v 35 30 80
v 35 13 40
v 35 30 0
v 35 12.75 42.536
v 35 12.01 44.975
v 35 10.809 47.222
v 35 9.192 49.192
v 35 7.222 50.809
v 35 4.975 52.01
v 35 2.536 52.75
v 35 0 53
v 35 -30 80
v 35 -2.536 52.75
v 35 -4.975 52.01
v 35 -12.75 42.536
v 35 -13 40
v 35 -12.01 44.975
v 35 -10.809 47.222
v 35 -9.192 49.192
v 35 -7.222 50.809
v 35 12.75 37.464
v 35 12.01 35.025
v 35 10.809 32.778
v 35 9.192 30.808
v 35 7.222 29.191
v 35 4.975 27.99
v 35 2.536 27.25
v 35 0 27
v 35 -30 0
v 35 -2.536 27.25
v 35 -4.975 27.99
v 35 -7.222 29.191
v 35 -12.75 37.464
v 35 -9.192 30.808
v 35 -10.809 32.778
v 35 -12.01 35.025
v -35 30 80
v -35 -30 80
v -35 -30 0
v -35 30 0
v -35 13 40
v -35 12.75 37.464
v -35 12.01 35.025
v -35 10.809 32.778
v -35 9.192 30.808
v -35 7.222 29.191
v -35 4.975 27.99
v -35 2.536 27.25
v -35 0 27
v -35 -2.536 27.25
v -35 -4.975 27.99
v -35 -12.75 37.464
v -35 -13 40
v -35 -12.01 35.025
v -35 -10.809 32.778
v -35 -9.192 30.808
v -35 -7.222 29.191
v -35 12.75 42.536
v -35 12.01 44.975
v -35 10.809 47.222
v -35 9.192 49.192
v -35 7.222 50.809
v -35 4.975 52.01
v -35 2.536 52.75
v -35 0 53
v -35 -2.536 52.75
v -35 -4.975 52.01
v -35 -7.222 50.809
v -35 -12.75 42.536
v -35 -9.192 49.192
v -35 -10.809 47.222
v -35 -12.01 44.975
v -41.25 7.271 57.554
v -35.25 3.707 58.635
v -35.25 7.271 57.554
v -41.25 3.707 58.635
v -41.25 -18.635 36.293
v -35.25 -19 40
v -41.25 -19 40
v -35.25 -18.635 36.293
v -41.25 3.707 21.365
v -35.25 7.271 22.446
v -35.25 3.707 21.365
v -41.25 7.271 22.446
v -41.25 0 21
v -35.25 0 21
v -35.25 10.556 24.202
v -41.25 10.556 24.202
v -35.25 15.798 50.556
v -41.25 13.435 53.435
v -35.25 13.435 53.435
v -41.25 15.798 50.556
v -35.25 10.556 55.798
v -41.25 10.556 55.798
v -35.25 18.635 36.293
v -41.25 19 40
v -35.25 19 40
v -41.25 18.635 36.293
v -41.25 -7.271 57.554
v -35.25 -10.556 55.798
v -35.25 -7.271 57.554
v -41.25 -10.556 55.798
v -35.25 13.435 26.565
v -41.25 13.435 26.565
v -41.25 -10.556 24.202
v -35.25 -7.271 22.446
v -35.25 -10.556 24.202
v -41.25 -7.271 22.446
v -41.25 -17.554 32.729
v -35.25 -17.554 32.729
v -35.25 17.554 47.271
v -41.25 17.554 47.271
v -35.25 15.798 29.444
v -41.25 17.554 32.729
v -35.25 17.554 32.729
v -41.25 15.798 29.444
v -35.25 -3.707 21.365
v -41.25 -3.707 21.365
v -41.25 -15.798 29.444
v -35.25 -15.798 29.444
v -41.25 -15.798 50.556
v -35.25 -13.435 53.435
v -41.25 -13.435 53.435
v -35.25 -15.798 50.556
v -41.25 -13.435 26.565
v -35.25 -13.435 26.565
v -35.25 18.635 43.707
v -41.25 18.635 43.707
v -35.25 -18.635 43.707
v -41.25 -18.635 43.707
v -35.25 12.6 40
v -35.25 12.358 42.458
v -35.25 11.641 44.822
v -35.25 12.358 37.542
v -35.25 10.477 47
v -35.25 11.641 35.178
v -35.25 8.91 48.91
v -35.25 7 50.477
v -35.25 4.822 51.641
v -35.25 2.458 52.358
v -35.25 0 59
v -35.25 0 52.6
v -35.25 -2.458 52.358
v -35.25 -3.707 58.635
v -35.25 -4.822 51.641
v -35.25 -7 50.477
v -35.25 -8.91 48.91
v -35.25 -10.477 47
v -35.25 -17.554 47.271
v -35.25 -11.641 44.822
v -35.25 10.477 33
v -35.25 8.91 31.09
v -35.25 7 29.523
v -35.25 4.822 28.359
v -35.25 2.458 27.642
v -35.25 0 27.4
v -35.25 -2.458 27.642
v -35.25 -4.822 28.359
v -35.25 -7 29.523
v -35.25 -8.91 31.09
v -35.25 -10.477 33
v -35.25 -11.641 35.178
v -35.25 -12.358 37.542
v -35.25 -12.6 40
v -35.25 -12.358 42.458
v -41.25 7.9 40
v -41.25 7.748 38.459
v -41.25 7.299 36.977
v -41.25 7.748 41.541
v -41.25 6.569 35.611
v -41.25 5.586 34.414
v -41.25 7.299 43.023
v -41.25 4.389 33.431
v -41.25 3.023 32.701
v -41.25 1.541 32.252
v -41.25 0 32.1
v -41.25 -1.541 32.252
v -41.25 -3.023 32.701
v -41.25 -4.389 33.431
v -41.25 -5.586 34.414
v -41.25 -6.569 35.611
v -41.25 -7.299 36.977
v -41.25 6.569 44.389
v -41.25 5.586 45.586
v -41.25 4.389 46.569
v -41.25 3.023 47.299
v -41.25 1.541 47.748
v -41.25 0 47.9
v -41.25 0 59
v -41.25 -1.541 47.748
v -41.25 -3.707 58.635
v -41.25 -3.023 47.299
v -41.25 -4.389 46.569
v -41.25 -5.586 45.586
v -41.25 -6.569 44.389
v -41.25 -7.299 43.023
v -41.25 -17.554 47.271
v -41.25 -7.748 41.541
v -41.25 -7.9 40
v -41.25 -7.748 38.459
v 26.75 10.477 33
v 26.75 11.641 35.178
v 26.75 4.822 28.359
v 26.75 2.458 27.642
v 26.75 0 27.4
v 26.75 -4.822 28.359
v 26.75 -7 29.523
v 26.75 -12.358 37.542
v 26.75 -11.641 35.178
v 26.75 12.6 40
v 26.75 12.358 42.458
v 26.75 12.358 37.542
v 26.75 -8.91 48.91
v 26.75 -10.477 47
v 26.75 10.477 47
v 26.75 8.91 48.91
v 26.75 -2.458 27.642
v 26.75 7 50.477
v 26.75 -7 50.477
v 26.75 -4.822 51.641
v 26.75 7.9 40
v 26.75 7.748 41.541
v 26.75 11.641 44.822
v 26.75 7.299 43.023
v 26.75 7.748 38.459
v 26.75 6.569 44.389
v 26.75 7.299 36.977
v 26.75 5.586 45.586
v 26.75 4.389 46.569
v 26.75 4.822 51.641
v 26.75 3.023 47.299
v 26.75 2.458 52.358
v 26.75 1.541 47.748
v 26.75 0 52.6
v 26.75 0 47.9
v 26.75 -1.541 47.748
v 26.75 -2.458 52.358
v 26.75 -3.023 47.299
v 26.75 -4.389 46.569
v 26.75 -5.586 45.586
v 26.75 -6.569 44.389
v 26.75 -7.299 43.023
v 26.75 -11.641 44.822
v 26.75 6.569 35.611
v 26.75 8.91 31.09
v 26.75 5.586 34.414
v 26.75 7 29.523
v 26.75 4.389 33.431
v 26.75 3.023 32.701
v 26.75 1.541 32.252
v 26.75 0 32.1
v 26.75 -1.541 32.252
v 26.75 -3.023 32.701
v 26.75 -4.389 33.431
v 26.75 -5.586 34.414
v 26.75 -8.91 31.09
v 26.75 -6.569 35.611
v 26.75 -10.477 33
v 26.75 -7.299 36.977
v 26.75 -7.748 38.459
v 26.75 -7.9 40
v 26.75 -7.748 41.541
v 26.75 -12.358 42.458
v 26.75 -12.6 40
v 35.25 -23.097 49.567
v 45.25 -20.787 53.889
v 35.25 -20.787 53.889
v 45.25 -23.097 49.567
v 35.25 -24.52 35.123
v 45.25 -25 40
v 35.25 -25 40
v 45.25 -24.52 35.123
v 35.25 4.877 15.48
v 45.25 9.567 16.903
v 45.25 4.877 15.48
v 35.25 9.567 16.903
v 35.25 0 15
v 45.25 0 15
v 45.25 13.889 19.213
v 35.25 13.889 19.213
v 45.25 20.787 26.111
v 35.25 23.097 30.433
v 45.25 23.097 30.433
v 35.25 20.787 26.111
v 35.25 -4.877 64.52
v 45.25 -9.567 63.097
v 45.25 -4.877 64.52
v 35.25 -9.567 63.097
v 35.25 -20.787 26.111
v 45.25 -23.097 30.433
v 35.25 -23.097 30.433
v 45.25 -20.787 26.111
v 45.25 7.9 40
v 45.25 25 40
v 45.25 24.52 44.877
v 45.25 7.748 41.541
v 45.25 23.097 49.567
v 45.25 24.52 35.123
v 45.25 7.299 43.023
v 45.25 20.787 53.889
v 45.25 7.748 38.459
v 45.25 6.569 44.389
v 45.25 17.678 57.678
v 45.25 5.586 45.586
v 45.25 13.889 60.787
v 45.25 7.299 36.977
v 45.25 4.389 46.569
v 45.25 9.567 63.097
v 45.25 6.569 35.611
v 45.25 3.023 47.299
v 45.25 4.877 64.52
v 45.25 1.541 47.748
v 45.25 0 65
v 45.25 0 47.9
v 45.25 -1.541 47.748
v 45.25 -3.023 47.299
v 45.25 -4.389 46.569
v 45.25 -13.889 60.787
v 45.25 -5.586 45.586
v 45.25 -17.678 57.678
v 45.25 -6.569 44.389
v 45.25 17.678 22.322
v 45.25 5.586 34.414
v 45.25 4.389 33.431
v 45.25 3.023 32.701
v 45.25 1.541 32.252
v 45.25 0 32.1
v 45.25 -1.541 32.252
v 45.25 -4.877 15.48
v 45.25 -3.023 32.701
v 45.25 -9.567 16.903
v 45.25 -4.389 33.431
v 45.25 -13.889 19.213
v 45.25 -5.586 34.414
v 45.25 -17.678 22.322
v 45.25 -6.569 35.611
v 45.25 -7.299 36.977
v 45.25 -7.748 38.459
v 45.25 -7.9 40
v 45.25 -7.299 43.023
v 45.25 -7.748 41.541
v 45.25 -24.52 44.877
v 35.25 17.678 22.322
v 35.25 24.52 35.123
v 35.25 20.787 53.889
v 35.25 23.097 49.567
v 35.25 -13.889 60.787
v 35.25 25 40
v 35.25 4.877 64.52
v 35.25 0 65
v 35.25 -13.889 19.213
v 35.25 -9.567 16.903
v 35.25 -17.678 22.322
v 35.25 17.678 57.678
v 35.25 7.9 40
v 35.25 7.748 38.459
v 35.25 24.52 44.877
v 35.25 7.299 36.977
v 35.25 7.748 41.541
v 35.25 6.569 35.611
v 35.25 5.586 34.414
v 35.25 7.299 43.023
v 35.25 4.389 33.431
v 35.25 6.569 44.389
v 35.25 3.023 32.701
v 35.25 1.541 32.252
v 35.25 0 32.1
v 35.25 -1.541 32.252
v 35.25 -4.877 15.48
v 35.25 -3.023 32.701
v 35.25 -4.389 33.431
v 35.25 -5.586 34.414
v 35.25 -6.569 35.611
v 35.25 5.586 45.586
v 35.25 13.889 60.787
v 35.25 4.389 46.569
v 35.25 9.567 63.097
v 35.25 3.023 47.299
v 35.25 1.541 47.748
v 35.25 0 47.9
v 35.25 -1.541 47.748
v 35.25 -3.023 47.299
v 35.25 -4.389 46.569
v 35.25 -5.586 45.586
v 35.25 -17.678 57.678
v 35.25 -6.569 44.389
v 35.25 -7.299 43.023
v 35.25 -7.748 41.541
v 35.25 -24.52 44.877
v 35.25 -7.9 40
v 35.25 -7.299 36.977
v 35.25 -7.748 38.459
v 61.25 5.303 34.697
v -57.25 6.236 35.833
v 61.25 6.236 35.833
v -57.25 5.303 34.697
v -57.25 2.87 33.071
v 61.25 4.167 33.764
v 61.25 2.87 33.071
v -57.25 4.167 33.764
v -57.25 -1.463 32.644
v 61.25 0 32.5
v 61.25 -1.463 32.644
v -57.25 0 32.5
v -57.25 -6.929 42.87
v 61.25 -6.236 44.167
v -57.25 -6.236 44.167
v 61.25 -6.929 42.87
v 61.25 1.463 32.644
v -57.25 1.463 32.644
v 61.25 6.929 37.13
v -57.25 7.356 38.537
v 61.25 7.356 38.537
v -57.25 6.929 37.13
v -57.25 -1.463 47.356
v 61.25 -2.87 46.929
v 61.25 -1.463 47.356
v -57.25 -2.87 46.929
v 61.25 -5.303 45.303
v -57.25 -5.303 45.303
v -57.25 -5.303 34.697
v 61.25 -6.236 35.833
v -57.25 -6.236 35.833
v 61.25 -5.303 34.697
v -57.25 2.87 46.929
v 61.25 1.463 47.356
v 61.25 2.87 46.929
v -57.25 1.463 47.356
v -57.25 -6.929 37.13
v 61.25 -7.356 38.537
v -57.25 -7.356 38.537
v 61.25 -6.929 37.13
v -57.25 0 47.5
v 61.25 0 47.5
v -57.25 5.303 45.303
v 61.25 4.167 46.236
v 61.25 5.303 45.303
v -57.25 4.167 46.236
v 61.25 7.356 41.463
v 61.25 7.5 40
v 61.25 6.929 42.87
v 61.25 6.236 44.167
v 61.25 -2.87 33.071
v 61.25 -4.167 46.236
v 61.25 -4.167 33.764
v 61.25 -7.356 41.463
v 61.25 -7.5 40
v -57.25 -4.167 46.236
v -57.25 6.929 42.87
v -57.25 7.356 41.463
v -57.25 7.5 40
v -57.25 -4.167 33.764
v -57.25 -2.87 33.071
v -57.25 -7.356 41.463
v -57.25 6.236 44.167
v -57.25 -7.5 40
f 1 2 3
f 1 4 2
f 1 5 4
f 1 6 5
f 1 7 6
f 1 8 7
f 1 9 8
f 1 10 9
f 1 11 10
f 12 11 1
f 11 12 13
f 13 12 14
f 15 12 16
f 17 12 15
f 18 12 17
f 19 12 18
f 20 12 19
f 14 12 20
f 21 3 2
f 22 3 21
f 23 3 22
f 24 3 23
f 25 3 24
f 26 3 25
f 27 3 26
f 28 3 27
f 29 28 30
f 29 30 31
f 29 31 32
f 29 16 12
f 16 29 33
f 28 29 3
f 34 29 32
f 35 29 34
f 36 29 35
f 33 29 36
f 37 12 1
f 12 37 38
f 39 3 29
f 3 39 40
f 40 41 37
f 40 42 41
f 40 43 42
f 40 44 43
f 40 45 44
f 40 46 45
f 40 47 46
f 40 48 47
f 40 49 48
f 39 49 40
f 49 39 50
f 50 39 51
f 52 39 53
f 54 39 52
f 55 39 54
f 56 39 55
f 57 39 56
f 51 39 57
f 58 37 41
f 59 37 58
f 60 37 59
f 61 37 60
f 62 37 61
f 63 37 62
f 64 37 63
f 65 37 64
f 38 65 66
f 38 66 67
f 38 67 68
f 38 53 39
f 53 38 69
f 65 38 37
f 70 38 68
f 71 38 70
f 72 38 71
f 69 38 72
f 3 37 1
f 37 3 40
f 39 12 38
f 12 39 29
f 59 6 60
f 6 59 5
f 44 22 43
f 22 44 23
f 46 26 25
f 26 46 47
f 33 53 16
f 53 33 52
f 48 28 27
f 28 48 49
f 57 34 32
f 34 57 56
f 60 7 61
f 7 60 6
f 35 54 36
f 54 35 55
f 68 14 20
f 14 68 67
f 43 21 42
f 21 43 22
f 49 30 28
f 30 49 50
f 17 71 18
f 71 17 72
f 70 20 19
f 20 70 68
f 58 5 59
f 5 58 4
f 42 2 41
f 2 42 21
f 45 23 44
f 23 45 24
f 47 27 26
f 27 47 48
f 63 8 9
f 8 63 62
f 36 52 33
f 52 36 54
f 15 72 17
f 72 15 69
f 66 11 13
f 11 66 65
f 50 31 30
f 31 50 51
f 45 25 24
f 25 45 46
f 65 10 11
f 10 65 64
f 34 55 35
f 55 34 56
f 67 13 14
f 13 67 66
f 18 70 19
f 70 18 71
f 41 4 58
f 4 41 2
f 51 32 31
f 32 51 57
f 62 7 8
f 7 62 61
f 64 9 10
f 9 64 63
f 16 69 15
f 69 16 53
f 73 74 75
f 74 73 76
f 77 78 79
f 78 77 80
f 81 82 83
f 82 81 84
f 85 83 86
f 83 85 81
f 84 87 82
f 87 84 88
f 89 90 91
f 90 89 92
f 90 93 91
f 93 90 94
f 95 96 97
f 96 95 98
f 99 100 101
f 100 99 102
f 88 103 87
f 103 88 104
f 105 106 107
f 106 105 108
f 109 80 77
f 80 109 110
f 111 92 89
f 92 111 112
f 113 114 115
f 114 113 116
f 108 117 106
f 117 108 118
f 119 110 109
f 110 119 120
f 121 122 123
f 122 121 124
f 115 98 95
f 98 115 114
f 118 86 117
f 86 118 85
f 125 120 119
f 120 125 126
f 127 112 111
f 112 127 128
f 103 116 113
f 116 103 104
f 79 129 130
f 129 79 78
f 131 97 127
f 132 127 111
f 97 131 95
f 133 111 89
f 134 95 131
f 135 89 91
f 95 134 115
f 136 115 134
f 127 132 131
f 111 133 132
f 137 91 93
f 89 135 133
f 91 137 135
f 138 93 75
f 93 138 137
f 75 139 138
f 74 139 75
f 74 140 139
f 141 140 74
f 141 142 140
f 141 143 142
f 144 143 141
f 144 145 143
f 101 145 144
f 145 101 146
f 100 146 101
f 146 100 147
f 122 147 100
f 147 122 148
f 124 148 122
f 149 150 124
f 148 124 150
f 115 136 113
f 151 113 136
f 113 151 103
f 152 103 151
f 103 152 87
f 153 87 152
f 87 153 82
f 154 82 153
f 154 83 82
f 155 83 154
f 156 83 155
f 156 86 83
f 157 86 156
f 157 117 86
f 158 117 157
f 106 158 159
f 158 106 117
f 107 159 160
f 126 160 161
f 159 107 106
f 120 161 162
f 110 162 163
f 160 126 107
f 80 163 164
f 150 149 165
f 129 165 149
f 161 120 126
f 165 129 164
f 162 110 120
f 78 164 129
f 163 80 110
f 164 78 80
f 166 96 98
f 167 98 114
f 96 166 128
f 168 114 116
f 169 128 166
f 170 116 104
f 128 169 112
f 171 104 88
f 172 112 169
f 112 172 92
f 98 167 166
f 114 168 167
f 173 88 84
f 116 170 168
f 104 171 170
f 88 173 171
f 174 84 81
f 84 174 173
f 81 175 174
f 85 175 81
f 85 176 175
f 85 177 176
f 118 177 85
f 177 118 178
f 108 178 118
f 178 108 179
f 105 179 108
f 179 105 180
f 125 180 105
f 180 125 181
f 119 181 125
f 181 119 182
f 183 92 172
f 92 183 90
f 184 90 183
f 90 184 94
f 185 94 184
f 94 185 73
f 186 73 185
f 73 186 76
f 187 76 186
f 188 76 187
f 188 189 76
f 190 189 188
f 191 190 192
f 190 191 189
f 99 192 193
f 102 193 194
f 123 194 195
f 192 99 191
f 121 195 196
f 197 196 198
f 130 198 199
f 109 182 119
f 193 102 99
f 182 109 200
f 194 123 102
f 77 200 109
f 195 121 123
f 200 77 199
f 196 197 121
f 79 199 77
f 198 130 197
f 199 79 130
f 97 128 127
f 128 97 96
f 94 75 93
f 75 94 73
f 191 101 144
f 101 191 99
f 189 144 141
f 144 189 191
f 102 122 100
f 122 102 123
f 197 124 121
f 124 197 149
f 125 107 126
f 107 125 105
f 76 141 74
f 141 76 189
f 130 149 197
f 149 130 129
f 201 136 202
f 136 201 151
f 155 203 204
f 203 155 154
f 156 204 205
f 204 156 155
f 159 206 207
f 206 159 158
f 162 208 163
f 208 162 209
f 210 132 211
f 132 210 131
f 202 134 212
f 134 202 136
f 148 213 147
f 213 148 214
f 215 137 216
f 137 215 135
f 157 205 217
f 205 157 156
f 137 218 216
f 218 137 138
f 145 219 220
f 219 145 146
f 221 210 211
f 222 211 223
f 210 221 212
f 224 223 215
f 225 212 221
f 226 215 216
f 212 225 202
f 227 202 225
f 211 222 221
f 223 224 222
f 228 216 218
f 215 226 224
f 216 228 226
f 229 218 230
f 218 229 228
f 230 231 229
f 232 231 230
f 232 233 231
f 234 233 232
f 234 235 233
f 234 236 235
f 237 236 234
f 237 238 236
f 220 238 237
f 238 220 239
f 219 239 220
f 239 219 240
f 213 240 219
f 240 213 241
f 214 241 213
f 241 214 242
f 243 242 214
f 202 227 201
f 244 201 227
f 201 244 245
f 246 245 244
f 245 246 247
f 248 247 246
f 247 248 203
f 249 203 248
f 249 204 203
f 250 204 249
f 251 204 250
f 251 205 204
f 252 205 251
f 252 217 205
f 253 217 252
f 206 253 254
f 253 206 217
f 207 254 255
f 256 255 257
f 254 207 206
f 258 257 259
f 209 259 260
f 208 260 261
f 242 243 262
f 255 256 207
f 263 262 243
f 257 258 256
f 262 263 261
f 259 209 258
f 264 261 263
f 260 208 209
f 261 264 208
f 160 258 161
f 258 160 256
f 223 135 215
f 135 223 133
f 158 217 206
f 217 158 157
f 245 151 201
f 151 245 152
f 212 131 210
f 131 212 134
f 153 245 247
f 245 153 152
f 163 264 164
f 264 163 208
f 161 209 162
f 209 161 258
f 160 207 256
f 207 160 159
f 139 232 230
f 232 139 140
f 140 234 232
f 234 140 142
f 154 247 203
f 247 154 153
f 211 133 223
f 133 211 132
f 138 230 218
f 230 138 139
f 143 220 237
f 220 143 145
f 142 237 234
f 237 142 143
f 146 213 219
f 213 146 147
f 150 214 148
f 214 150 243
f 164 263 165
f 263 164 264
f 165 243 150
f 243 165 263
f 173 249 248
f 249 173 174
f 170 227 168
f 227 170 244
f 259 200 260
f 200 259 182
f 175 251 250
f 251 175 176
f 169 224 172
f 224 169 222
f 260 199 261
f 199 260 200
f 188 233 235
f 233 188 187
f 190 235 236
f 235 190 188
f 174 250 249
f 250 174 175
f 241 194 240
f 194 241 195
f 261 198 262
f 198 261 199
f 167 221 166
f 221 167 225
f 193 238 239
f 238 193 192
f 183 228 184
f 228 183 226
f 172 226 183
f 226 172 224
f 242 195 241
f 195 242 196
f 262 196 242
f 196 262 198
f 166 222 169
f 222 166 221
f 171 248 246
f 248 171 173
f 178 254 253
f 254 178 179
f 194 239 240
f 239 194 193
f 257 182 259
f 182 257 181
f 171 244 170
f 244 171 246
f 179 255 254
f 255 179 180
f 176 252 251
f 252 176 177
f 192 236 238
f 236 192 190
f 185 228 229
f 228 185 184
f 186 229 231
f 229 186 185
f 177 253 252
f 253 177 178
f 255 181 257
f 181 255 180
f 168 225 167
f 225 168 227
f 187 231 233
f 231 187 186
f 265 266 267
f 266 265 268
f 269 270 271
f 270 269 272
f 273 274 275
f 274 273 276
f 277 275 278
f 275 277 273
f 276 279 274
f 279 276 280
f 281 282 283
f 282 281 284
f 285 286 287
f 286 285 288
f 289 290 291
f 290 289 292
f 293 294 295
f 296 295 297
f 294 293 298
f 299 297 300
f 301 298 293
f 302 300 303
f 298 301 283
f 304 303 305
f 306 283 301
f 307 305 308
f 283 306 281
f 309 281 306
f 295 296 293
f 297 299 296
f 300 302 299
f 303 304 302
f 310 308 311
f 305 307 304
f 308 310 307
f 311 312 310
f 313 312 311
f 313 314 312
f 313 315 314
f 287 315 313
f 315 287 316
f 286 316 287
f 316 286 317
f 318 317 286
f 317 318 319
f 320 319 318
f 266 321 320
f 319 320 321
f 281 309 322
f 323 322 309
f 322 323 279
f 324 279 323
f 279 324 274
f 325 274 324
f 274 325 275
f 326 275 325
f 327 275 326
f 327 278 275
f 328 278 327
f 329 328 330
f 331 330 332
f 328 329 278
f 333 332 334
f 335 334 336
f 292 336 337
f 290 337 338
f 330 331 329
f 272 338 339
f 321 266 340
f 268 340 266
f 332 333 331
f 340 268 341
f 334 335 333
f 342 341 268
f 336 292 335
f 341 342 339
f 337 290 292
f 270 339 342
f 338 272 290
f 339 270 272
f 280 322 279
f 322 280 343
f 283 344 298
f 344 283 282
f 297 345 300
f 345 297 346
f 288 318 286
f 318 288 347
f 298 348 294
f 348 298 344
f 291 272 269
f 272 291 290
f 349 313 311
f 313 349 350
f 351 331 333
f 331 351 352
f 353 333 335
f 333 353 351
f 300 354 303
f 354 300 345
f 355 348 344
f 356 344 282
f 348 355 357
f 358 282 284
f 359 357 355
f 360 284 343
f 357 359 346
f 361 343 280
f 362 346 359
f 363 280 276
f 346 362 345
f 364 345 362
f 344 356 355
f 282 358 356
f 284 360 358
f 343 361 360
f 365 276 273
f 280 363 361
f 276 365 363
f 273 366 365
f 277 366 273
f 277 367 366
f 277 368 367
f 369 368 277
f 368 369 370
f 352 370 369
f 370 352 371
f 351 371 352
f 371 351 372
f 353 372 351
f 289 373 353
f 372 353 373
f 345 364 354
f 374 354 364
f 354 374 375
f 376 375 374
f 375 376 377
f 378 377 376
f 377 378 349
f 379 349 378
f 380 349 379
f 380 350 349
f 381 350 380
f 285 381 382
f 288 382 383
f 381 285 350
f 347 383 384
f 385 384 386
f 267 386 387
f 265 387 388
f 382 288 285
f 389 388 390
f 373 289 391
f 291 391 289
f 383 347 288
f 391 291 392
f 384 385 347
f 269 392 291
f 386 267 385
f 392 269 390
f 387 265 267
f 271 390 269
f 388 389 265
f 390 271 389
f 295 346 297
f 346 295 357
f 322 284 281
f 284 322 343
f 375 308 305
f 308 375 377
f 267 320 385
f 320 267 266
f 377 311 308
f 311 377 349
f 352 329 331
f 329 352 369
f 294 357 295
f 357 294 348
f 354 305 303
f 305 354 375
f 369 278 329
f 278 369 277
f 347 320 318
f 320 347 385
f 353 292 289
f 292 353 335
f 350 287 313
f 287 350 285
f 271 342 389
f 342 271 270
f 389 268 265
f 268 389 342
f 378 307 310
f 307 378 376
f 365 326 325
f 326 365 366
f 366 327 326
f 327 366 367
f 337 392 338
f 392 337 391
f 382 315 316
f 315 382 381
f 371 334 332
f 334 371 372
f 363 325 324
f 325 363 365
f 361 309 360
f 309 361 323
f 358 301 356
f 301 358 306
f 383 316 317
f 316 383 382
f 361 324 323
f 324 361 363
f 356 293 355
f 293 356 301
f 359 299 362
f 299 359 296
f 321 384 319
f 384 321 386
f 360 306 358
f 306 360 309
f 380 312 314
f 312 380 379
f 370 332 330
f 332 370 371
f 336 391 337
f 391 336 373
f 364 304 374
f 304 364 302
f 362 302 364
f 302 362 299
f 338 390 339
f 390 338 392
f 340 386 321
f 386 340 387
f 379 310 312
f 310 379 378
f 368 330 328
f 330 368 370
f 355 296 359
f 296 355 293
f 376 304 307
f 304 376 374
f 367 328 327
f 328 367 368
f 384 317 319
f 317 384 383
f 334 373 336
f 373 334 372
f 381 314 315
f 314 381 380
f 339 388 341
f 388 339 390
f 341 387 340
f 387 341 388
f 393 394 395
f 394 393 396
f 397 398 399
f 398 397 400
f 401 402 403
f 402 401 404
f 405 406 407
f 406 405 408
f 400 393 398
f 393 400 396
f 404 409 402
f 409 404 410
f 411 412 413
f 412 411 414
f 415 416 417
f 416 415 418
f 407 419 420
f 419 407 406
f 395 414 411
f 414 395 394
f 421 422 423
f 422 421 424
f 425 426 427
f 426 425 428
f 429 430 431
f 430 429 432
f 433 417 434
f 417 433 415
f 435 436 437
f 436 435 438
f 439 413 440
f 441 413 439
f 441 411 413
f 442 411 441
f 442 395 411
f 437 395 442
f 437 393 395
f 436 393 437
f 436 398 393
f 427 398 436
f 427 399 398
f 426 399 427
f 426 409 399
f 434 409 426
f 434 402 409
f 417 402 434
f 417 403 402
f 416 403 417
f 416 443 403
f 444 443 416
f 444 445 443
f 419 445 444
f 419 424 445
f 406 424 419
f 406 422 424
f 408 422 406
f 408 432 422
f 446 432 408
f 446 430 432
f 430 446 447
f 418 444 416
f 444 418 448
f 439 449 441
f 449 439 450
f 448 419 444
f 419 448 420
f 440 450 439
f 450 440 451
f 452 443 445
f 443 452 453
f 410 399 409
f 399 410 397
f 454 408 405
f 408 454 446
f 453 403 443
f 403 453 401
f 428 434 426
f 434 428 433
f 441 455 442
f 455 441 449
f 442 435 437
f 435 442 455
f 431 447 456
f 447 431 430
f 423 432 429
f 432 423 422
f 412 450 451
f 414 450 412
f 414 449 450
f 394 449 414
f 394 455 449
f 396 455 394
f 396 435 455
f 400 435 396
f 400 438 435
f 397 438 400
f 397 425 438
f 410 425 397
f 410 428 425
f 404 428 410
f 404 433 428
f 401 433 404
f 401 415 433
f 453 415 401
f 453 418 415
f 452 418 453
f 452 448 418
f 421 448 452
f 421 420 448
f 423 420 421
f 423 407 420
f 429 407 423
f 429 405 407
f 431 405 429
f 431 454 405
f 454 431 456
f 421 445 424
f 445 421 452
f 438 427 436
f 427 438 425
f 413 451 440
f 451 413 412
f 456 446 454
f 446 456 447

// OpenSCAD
$fn = 32;

// ------------------------------------------------------------------------
// Bushed housing: 70 x 60 x 80 mm housing, bushing d25.2
// Every part is its own module, assembly() places them once.
// ------------------------------------------------------------------------

// --- part 1 ---
module housing() {
  difference() {
    translate([-35, -30, 0]) cube([70, 60, 80]);
    translate([0, 0, 40]) rotate([0, 90, 0]) cylinder(h = 72, d = 26, center = true);
  }
}

// --- part 2 ---
module bushing() {
  difference() {
    union() {
      cylinder(h = 6, d = 38);
      translate([0, 0, 6]) cylinder(h = 62, d = 25.2);
    }
    translate([0, 0, -1]) cylinder(h = 70, d = 15.8);
  }
}

// --- part 3 ---
module shaft() {
  translate([0, 0, -59.25]) cylinder(h = 118.5, d = 15);
}

// --- part 4 ---
module cover() {
  difference() {
    cylinder(h = 10, d = 50);
    translate([0, 0, -1]) cylinder(h = 12, d = 15.8);
  }
}

// --- assembly ---
module assembly() {
  translate([0, 0, 0]) rotate([0, 0, 0]) housing();
  translate([-41.25, 0, 40]) rotate([0, 90, 0]) bushing();
  translate([2, 0, 40]) rotate([0, 90, 0]) shaft();
  translate([35.25, 0, 40]) rotate([0, 90, 0]) cover();
}

assembly();
